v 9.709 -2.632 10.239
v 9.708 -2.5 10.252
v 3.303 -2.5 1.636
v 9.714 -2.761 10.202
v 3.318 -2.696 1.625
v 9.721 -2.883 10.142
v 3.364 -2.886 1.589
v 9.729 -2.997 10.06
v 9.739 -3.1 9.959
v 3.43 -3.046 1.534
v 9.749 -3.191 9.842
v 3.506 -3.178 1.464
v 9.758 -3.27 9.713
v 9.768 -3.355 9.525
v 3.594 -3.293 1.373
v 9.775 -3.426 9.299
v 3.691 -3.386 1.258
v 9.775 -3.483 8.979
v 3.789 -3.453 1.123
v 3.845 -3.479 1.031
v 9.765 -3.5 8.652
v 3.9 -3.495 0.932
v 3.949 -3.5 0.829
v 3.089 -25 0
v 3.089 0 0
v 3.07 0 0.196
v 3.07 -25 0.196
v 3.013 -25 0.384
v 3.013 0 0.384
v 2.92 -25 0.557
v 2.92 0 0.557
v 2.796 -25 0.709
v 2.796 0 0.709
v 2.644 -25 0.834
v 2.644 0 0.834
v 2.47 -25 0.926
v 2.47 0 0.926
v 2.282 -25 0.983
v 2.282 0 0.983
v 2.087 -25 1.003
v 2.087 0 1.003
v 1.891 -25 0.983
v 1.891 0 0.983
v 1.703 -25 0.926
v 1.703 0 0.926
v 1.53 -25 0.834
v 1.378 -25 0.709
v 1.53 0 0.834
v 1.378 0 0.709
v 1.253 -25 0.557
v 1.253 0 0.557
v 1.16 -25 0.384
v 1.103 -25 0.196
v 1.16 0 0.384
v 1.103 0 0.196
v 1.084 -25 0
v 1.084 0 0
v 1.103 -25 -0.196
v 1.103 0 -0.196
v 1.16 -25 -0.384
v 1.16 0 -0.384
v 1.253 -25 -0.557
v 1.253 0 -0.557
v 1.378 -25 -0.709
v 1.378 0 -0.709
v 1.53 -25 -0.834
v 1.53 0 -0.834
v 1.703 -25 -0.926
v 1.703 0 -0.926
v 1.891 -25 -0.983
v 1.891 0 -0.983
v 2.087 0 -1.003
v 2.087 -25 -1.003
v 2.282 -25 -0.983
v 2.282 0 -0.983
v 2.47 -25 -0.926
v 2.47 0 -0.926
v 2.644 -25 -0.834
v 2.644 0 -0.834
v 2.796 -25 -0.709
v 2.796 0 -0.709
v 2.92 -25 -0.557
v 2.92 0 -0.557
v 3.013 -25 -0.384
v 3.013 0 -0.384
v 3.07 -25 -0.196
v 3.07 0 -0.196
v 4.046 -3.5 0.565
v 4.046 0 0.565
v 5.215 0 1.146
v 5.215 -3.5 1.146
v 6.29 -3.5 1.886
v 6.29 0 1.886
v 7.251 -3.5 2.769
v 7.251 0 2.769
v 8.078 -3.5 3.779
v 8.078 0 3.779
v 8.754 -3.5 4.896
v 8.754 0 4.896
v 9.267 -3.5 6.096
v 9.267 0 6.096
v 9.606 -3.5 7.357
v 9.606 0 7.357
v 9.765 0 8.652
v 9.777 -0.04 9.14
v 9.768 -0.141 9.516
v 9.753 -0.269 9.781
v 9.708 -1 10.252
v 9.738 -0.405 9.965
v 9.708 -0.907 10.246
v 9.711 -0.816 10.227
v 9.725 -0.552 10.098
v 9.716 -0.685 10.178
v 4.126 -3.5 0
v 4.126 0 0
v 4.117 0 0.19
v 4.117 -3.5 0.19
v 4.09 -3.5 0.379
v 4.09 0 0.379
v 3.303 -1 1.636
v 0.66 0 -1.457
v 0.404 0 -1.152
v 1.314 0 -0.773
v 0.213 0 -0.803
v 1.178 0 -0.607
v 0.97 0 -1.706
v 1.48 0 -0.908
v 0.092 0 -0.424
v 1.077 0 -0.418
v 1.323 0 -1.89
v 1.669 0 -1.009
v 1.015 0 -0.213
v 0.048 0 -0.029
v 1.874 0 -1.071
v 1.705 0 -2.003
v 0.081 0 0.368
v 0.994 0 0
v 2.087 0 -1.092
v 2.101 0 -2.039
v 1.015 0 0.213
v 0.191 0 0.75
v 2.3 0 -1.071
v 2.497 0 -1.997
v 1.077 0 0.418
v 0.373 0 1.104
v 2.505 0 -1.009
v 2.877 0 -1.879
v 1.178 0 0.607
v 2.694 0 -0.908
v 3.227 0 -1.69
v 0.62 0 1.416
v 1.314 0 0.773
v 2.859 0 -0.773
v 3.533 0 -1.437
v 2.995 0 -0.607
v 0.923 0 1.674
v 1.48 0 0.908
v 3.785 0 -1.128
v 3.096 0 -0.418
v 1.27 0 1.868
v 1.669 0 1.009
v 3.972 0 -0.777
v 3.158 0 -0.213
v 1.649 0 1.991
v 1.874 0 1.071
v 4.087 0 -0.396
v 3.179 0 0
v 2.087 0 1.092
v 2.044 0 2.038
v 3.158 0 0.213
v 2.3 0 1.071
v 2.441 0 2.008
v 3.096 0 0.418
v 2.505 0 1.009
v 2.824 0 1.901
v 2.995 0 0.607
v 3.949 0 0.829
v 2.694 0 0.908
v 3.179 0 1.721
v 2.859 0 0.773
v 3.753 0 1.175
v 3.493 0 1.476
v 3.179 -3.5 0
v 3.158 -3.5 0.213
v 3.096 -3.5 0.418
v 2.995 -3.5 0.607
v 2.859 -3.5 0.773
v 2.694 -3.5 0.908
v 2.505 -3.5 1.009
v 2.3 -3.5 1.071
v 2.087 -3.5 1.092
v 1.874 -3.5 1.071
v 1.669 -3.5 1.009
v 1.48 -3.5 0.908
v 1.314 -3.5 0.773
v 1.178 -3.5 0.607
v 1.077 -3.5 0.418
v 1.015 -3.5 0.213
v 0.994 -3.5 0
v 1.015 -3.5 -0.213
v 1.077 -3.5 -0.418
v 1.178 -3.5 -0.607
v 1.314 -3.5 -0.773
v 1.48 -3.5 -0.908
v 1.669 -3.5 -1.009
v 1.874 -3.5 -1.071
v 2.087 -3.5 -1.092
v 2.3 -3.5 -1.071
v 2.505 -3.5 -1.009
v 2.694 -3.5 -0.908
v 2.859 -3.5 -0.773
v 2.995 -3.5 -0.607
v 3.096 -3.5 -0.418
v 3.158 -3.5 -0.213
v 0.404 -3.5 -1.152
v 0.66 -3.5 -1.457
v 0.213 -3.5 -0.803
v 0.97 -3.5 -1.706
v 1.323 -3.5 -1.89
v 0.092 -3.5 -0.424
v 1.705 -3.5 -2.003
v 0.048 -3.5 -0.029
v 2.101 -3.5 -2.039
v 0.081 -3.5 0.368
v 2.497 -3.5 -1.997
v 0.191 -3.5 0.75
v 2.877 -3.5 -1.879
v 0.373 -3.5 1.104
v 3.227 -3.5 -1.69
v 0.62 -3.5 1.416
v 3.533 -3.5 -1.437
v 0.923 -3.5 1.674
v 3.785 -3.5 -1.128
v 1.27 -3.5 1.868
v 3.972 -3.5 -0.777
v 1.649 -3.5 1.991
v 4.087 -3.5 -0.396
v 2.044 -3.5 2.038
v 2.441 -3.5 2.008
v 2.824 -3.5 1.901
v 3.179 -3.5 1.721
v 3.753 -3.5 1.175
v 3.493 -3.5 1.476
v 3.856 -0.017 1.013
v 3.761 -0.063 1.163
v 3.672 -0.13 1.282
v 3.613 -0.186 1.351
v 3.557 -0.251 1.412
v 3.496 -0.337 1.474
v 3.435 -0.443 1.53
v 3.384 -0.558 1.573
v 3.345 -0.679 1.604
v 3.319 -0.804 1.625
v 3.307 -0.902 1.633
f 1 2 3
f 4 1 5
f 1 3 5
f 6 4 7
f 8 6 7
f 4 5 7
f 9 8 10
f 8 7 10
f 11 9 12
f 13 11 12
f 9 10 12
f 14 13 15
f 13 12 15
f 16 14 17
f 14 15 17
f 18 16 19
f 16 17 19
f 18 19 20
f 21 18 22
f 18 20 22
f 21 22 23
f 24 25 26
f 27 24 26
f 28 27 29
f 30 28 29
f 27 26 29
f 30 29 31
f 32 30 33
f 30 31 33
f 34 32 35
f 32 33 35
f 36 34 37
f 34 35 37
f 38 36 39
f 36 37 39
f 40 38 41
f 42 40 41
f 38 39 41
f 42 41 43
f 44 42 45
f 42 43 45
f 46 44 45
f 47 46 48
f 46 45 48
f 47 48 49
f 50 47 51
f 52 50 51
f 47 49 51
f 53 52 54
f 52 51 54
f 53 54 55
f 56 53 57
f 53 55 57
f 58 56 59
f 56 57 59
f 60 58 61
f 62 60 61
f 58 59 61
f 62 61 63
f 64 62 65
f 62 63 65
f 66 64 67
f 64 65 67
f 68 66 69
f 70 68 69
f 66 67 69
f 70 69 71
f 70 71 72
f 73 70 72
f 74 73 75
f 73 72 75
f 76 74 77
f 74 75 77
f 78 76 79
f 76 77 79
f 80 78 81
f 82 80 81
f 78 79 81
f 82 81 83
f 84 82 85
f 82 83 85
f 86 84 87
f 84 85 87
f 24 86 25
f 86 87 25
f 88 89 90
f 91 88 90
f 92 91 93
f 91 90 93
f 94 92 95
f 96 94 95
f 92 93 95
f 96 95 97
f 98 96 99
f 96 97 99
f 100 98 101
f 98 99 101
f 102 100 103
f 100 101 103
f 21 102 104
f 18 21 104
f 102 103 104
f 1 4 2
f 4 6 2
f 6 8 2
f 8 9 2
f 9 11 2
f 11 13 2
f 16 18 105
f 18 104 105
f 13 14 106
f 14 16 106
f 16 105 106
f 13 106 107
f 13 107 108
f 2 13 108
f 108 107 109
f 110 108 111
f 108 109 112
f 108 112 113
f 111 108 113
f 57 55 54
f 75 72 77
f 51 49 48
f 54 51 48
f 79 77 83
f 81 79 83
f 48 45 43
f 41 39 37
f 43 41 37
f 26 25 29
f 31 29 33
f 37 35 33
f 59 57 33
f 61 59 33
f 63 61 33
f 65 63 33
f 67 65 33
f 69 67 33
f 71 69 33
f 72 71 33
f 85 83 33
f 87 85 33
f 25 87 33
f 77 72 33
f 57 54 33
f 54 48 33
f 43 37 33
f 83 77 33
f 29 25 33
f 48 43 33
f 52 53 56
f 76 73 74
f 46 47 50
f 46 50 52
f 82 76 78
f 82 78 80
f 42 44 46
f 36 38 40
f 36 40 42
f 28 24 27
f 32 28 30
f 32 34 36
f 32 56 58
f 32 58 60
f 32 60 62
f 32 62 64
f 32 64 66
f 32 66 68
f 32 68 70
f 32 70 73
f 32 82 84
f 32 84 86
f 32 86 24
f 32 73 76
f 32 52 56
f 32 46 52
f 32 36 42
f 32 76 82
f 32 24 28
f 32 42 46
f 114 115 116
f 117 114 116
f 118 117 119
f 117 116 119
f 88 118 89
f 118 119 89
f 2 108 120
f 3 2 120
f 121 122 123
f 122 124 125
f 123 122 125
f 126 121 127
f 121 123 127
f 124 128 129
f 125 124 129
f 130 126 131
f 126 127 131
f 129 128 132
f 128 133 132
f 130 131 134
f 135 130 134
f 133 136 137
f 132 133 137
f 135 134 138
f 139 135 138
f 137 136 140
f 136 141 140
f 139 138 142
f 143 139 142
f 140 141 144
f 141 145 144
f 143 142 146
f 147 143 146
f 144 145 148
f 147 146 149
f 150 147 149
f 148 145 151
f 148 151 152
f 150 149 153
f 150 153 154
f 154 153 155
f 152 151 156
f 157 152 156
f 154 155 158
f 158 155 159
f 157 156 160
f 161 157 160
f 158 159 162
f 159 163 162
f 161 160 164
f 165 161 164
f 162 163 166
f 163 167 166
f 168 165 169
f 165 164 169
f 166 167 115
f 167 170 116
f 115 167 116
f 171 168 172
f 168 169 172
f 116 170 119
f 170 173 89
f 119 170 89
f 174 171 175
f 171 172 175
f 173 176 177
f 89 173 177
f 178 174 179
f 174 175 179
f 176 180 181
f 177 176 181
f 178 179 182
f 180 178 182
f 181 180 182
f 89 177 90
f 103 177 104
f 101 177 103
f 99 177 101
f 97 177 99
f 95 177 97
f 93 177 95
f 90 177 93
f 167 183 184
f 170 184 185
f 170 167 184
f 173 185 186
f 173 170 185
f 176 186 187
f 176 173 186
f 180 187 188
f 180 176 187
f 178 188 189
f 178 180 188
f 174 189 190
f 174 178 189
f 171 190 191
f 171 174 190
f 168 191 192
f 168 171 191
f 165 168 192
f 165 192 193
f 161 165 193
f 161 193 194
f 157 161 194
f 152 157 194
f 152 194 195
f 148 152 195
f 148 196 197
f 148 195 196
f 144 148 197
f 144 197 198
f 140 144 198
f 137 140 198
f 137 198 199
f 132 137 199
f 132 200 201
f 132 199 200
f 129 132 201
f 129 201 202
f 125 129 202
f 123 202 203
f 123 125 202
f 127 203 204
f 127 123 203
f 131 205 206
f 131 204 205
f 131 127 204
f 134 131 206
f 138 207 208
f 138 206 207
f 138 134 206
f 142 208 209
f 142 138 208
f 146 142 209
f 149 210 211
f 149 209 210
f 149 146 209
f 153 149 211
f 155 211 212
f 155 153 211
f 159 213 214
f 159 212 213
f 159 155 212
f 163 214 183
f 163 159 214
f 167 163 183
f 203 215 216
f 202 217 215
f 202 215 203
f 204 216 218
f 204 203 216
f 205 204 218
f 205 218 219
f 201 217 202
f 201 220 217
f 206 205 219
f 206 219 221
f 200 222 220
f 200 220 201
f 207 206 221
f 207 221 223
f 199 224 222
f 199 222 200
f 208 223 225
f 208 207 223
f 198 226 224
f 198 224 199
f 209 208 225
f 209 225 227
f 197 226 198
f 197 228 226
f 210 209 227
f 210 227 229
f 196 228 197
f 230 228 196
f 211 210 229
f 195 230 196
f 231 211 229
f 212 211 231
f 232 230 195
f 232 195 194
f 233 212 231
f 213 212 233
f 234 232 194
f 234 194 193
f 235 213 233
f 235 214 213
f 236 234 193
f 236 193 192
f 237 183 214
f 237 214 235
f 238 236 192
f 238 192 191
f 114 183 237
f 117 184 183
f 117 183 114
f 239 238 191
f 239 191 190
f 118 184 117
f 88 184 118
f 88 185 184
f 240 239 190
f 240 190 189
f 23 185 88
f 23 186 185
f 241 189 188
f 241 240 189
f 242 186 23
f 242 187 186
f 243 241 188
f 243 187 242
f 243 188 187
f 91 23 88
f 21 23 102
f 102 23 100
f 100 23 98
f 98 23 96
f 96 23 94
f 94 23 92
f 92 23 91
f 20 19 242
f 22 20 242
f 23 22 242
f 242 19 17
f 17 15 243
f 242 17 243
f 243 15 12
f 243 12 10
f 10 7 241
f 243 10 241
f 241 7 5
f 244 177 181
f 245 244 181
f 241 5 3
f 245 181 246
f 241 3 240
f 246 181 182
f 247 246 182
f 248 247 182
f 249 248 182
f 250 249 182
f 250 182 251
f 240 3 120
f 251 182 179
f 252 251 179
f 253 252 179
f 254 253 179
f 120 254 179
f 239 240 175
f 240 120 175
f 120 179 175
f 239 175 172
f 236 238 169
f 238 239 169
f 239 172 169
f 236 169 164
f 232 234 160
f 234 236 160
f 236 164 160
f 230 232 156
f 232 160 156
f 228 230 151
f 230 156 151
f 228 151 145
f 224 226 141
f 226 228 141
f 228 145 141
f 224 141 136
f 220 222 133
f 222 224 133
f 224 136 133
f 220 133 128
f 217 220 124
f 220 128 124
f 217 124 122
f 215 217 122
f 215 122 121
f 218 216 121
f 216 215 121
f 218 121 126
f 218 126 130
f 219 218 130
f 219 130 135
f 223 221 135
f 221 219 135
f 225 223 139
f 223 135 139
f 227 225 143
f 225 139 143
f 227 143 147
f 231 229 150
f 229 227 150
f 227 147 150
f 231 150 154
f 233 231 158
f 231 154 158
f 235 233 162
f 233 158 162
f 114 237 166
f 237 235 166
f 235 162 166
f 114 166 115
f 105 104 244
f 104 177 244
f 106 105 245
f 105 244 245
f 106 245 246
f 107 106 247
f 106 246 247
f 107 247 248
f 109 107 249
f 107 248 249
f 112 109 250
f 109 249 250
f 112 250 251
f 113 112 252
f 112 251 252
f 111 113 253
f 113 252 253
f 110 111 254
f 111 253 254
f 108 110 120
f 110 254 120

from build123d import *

# Parameters (mm, degrees)
F1_DEPTH = 3.5
F2_R     = 1.0924829463
F3_DEPTH = 59.1
F4_R     = 1
F5_R     = 1
F6_R     = 1.0026125985
F7_DEPTH = 25


with BuildPart() as f1:
    # F0 (on Front) → F1 (new body)
    with BuildSketch(Plane.XZ):
        with BuildLine():
            Line((3.3030178364, 1.6362452487), (2.0866938867, 0))
            ThreePointArc((2.0866938867, 0), (3.0818293236, 0.228166657), (4.0457910308, 0.564518241))
            ThreePointArc((4.0457910308, 0.564518241), (3.7623950759, 1.1613647098), (3.3030178364, 1.6362452487))
        make_face()
        with BuildLine():
            ThreePointArc((4.0457910308, 0.564518241), (3.0818293236, 0.228166657), (2.0866938867, 0))
            Line((2.0866938867, 0), (3.3030178364, 1.6362452487))
            ThreePointArc((3.3030178364, 1.6362452487), (0.2650744454, -0.9156664654), (4.1255029667, 0))
            ThreePointArc((4.1255029667, 0), (4.1054766277, 0.285059133), (4.0457910308, 0.564518241))
        make_face()
        with BuildLine():
            ThreePointArc((3.3030178364, 1.6362452487), (3.7623950759, 1.1613647098), (4.0457910308, 0.564518241))
            ThreePointArc((4.0457910308, 0.564518241), (8.5115261525, 4.4528066863), (9.7076622769, 10.2520165965))
            Line((9.7076622769, 10.2520165965), (3.3030178364, 1.6362452487))
        make_face()
    extrude(amount=F1_DEPTH)

    # F2 (on Front) → F3 (cut)
    with BuildSketch(Plane.XZ):
        with Locations((2.0866938867, 0)):
            Circle(F2_R)
    extrude(amount=F3_DEPTH, mode=Mode.SUBTRACT)

    # F4
    f4_edges = [f1.edges().sort_by_distance(p)[0] for p in [
        (6.50534, -3.5, 5.944131),
    ]]
    fillet(f4_edges, radius=F4_R)

    # F5
    f5_edges = [f1.edges().sort_by_distance(p)[0] for p in [
        (6.50534, 0, 5.944131),
    ]]
    fillet(f5_edges, radius=F5_R)


with BuildPart() as f7:
    # F6 (on Front) → F7 (new body)
    with BuildSketch(Plane.XZ):
        with Locations((2.0866941195, 0)):
            Circle(F6_R)
    extrude(amount=F7_DEPTH)


solid = Compound([f1.part, f7.part])
